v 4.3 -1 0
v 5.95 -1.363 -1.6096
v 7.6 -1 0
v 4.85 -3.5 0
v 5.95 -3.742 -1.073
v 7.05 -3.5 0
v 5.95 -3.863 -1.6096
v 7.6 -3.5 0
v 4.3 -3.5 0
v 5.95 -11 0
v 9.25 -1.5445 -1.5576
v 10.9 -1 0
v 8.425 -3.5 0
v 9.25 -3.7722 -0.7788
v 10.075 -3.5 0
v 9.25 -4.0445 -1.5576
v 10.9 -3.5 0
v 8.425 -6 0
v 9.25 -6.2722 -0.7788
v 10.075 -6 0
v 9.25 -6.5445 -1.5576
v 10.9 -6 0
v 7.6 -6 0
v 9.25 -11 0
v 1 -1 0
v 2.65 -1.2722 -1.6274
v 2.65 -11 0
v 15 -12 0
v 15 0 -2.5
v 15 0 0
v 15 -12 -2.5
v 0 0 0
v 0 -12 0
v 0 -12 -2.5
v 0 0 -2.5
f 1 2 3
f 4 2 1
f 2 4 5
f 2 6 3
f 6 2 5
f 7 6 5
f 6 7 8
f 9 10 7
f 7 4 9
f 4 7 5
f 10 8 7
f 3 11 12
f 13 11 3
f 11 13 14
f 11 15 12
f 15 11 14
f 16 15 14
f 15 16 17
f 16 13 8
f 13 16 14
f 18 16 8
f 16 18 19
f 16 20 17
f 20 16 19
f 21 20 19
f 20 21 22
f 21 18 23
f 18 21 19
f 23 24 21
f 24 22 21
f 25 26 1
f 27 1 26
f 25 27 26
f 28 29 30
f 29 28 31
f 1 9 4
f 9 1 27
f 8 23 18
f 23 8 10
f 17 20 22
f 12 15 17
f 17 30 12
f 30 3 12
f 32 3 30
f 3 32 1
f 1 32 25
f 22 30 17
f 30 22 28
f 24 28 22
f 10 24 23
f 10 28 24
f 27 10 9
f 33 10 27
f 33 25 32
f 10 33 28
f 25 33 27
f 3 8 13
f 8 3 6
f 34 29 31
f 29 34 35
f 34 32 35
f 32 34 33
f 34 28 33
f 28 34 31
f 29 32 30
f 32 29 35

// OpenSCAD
// file: cuneiform.scad
module wedge(x, y, z, w, h, phi, o=false){
	// o is for offset, an experiment with moving the stroke so that its greatest depth would be at the origin point
	// It's not working very well; just don't use it for now
	// Also need to extend the stroke by delta if we do that
	
	s = w / sqrt(2);
	d = w / 2; // Depth of stroke, from head to deepest point
	l = sqrt(h*h - d*d); // Length of stroke, from deepest point to tip
	theta = atan(d/l); // Angle of stylus
	delta = o ? d*sin(theta) : 0; // Horizontal distance from head of wedge to greatest depth

	translate([x, y, z])
	rotate([0, 0, phi])
	translate([-delta, 0, 0])
	rotate([0, -theta, 0])
	rotate([45, 0, 0])
	translate([0, -s/2, -s/2])
	cube([l, s, s]);
}

module haken(x, y, z, s, d){
	w = s*sqrt(2);
	theta = atan(d/(w/2));
	translate([x, y, z])
	rotate([0, -theta, 0])
	translate([0, 0, -d])
	rotate([0, 0, -45])
	cube([s, s, d]);
}

module singlestroke(x, y, w, h){ // Vertical, positioned from top left corner
	w2 = min(h, w);
	wedge(x+w/2, y, 0, w2, h, 90);
}

module doublestroke(x, y, w, h){
	dist = min(w, h/4);
	h2 = h - dist;
	singlestroke(x, y, w, h2);
	singlestroke(x, y+dist, w, h2);
}

module triplestroke(x, y, w, h){
	dist = min(w, h/4);
	h2 = h - dist*2;
	singlestroke(x, y, w, h2);
	singlestroke(x, y+dist, w, h2);
	singlestroke(x, y+dist*2, w, h2);
}

module hookstroke(x, y, w, h, factor=0.75){
	hh = (w-h/2<0.0001) ? factor*h : h; // By default, the renderer produces hakens that are twice as tall as they are wide - but that means d = 0!
	// We fix this by reducing h by a factor < 1, when this happens
	s = hh / sqrt(2);
	d = sqrt(w*w - hh*hh/4);
	haken(x, y+h/2, 0, s, d); // Use h instead of hh because the haken() module wants the position of the tip, and that needs to be at the midpoint of the *original* bounding box
}
	
// main file
use <cuneiform.scad>

/*
module wedge(x, y, z, w, h, phi){
	s = w / sqrt(2);
	l = sqrt(h*h - s*s - s*s);
	theta = atan((w/2)/l);

	translate([x, y, z])
	rotate([0, 0, phi])
	rotate([0, -theta, 0])
	rotate([45, 0, 0])
	translate([0, -s/2, -s/2])
	cube([l, s, s]);
}

module haken(x, y, z, s, d){
	w = s*sqrt(2);
	theta = atan(d/(w/2));
	translate([x, y, z])
	rotate([0, -theta, 0])
	translate([0, 0, -d])
	rotate([0, 0, -45])
	cube([s, s, d]);
}
*/

//wedge(0, 0, 0, 10, 30, 30);
//haken(0, 0, 0, 20);

/*
difference(){
	translate([0, 0, -2.5])
		cube([60, 40, 5], center=true);
	wedge(-25, 0, 0, 10, 30, 0);
	wedge(-10, 0, 0, 10, 30, 0);
	wedge(5, 15, 0, 10, 30, -90);
	haken(10, 0, 0, 10, 5);
}
*/

scale([1,-1,1]){
	difference(){
		translate([0,0,-2.5])
			cube([15,12,2.5]);
		union(){
			translate([1,1,0]){
				scale([10,10,10]){
					singlestroke(0, 0, 0.33, 1);
					doublestroke(0.33, 0, 0.33, 1);
					triplestroke(0.66, 0, 0.33, 1);
					hookstroke(0.99, 0, 0.33, 1);
				}
			}
		}
	}
}
